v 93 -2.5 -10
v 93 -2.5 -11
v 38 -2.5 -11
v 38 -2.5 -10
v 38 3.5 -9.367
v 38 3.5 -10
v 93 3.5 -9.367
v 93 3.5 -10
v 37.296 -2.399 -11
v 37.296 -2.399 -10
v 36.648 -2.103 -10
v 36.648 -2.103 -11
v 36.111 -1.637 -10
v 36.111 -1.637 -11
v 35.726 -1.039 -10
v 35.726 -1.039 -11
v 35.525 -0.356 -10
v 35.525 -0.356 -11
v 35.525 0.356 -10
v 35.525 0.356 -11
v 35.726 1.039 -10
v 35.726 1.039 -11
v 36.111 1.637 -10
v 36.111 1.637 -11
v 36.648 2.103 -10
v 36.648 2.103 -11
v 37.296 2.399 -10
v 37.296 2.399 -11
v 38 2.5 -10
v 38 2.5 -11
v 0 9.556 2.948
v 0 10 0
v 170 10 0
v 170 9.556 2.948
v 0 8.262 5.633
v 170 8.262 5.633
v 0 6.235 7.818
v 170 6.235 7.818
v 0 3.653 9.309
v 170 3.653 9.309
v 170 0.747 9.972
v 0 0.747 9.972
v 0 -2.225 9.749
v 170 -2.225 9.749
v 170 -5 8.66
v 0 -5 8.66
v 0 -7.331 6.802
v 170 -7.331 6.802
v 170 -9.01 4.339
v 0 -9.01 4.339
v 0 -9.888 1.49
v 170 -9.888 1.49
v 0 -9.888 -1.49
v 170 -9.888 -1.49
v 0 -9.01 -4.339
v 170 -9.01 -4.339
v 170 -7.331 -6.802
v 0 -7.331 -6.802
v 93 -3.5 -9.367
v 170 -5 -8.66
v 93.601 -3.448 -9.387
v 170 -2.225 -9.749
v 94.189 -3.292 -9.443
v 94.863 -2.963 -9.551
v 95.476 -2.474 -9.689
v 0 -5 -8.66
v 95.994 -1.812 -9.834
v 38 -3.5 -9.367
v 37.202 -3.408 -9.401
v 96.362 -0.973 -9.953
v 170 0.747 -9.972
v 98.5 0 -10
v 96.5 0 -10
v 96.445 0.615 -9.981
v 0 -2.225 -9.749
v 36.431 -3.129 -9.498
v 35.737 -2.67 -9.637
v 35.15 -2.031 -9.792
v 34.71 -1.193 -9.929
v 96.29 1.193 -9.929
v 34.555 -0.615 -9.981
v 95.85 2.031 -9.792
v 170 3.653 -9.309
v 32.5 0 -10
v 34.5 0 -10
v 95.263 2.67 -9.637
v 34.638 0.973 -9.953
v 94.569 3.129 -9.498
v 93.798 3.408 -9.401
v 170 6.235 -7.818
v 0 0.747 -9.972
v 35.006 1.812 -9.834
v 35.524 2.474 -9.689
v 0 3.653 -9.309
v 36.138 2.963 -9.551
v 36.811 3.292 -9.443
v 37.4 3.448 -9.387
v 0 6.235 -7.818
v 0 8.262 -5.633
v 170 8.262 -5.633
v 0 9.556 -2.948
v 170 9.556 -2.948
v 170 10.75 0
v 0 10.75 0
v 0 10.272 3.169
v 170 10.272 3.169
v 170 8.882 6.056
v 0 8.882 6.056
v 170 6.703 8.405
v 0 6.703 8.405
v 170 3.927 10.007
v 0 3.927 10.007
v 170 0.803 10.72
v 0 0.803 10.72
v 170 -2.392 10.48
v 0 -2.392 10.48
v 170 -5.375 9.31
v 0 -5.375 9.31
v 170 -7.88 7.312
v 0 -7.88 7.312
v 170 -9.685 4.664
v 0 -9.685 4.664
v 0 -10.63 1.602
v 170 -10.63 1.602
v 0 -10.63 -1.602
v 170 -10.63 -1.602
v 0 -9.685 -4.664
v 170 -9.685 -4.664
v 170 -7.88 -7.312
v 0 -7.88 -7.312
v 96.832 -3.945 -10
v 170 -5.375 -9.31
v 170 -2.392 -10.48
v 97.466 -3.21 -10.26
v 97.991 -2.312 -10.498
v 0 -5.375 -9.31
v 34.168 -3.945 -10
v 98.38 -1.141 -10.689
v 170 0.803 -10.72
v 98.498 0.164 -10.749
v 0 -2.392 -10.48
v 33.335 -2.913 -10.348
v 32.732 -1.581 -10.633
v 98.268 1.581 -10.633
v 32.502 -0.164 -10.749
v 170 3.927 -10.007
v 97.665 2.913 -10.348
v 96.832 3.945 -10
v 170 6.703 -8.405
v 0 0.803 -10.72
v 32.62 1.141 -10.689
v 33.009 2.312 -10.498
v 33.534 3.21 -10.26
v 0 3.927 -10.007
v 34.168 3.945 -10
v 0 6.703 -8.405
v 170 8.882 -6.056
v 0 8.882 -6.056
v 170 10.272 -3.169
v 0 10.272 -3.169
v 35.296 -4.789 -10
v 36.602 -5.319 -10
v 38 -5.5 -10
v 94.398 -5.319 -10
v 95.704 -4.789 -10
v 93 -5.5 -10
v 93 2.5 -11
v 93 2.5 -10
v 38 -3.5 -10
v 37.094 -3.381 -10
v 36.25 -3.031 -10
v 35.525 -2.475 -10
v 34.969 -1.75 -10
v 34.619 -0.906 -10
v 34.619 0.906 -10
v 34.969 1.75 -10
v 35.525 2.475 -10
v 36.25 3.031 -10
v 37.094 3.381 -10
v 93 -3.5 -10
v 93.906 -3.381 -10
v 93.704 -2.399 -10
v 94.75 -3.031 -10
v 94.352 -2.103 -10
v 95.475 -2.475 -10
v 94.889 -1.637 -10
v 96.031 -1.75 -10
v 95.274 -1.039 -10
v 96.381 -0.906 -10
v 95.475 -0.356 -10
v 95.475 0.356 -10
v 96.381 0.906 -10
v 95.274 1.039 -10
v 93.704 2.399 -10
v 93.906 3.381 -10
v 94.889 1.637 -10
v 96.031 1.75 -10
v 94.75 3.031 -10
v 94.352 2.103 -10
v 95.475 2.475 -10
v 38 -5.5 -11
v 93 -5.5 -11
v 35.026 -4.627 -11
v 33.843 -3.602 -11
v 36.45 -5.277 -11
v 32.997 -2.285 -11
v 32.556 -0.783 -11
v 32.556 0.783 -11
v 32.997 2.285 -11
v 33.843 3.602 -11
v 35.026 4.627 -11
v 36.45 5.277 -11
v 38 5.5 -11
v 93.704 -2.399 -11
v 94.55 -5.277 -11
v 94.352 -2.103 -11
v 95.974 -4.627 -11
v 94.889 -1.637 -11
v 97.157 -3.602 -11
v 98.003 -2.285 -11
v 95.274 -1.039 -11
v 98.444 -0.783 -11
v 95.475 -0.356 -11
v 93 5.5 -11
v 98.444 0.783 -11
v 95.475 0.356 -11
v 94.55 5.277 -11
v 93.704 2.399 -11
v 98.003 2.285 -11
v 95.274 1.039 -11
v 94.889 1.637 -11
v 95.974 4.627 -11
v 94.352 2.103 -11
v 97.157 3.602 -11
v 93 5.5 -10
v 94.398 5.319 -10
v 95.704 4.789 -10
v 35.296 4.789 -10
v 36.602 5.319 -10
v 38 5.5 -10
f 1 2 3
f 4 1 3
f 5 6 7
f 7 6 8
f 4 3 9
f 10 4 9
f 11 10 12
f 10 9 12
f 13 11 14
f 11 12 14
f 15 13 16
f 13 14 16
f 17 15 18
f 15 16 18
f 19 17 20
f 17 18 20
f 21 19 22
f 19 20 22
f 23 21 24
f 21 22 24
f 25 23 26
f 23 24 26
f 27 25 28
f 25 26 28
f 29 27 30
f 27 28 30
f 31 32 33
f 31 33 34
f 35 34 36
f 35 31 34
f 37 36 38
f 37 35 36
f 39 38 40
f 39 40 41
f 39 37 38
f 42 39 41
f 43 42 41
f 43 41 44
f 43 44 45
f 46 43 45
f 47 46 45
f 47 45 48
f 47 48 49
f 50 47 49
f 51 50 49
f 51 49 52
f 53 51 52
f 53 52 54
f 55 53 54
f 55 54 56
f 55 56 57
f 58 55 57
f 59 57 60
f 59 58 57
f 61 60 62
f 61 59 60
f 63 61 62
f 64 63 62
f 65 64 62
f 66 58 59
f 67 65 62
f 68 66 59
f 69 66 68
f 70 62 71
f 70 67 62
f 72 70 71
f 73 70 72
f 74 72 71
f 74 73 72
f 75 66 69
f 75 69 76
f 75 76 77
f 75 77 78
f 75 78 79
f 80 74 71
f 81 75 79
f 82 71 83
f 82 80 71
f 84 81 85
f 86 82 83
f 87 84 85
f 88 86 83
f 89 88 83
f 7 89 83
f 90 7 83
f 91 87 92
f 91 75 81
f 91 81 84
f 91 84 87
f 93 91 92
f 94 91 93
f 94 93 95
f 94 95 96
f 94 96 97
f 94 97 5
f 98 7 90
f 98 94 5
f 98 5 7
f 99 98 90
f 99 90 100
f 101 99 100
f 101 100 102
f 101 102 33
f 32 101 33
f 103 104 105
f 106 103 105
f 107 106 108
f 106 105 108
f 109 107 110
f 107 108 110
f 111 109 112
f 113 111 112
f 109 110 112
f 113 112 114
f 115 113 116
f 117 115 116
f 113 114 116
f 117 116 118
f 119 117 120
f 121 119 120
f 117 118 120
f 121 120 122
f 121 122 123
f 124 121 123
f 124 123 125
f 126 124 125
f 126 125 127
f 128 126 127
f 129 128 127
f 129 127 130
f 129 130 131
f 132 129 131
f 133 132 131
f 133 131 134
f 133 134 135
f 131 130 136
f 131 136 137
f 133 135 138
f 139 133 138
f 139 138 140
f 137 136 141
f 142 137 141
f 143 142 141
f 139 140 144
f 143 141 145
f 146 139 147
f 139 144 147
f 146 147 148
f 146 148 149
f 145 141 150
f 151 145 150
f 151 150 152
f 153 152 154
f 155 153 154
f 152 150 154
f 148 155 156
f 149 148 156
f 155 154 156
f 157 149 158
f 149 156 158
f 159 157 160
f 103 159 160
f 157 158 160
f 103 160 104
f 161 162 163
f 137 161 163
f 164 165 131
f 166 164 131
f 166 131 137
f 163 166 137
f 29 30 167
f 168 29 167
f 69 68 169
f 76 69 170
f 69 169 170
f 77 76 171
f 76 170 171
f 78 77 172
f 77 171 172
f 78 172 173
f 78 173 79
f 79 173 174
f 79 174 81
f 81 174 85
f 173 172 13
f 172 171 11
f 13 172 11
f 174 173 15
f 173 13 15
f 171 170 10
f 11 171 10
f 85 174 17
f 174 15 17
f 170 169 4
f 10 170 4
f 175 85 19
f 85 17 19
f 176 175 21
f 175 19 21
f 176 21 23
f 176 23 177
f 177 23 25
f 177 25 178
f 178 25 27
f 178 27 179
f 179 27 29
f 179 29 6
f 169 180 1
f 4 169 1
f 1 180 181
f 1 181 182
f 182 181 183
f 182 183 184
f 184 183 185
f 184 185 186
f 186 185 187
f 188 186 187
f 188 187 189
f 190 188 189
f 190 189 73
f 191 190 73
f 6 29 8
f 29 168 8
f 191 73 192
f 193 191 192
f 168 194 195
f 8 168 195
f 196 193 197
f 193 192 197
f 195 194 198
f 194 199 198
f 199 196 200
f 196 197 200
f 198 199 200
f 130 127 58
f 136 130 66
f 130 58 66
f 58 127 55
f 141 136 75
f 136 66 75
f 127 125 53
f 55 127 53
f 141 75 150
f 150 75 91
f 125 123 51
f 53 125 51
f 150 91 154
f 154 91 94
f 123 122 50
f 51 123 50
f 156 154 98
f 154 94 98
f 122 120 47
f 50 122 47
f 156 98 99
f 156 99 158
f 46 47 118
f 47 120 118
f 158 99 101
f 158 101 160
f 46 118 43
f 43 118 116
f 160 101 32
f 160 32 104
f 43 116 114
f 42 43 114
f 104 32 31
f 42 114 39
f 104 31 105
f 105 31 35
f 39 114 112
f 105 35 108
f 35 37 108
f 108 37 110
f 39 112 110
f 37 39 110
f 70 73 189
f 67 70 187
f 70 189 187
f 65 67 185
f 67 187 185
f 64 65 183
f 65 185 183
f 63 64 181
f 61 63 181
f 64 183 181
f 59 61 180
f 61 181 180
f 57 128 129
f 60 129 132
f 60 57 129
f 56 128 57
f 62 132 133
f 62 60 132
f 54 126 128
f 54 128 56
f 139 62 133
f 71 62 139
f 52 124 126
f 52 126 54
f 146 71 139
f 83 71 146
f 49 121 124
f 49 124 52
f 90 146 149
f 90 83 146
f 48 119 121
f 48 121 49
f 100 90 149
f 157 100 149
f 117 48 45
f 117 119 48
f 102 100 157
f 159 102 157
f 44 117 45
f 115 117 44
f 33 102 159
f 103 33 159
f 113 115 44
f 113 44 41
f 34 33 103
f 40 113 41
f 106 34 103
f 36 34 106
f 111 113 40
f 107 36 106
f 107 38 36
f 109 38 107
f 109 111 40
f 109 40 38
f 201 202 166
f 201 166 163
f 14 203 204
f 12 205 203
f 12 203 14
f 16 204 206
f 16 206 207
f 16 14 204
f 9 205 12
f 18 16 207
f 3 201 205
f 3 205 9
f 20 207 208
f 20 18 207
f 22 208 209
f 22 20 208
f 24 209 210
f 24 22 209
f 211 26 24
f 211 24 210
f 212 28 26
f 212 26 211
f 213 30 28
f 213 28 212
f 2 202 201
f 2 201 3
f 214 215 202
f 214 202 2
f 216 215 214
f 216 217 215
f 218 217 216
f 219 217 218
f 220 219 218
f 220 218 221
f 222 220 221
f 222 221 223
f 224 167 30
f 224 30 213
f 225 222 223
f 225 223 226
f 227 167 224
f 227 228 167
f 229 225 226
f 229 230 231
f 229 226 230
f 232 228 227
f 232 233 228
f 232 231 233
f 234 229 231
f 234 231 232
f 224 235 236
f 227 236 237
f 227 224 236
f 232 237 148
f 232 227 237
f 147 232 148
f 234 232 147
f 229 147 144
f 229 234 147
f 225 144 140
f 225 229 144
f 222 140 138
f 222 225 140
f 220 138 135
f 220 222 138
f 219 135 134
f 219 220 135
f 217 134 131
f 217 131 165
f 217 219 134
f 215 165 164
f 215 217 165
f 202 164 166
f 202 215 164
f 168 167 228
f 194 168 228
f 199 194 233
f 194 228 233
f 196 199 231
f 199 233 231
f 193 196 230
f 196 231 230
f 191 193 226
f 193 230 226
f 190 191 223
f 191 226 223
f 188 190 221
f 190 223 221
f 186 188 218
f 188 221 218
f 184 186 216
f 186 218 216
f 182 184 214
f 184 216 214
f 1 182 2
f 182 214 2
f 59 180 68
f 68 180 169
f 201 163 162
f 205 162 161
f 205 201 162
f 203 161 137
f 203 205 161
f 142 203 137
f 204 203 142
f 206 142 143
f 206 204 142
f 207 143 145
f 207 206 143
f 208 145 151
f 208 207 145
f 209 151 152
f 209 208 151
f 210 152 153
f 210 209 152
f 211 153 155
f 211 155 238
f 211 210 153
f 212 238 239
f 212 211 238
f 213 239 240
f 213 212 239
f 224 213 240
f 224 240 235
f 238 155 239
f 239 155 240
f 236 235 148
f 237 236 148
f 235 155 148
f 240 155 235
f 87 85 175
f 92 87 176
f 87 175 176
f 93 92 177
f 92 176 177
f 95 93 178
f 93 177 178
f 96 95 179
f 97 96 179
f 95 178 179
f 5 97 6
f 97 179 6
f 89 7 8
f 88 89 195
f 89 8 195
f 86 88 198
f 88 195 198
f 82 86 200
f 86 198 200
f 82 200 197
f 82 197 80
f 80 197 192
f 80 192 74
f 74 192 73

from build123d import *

# Parameters (mm, degrees)
SKETCH005_R     = 10.75
SKETCH005_R_2   = 10
PAD001_DEPTH    = 170
POCKET013_DEPTH = 5
PAD009_DEPTH    = 1


with BuildPart() as part:
    # Sketch005 → Pad001 (new body)
    with BuildSketch(Plane.YZ):
        Circle(SKETCH005_R)
        Circle(SKETCH005_R_2, mode=Mode.SUBTRACT)
    extrude(amount=PAD001_DEPTH)

    # Sketch021 (on DatumPlane) → Pocket013 (cut)
    with BuildSketch(Plane.YX.offset(11)):
        with BuildLine():
            ThreePointArc((3.5, 93), (0, 96.5), (-3.5, 93))
            Line((-3.5, 93), (-3.5, 38))
            ThreePointArc((-3.5, 38), (0, 34.5), (3.5, 38))
            Line((3.5, 38), (3.5, 93))
        make_face()
    extrude(amount=-POCKET013_DEPTH, mode=Mode.SUBTRACT)

    # Sketch026 (on DatumPlane) → Pad009 (join)
    with BuildSketch(Plane.YX.offset(11)):
        with BuildLine():
            ThreePointArc((5.5, 93), (0, 98.5), (-5.5, 93))
            Line((-5.5, 93), (-5.5, 38))
            ThreePointArc((-5.5, 38), (0, 32.5), (5.5, 38))
            Line((5.5, 38), (5.5, 93))
        make_face()
        with BuildLine():
            ThreePointArc((-2.5, 38), (0, 35.5), (2.5, 38))
            Line((2.5, 38), (2.5, 93))
            ThreePointArc((2.5, 93), (0, 95.5), (-2.5, 93))
            Line((-2.5, 93), (-2.5, 38))
        make_face(mode=Mode.SUBTRACT)
    extrude(amount=-PAD009_DEPTH)


solid = part.part
